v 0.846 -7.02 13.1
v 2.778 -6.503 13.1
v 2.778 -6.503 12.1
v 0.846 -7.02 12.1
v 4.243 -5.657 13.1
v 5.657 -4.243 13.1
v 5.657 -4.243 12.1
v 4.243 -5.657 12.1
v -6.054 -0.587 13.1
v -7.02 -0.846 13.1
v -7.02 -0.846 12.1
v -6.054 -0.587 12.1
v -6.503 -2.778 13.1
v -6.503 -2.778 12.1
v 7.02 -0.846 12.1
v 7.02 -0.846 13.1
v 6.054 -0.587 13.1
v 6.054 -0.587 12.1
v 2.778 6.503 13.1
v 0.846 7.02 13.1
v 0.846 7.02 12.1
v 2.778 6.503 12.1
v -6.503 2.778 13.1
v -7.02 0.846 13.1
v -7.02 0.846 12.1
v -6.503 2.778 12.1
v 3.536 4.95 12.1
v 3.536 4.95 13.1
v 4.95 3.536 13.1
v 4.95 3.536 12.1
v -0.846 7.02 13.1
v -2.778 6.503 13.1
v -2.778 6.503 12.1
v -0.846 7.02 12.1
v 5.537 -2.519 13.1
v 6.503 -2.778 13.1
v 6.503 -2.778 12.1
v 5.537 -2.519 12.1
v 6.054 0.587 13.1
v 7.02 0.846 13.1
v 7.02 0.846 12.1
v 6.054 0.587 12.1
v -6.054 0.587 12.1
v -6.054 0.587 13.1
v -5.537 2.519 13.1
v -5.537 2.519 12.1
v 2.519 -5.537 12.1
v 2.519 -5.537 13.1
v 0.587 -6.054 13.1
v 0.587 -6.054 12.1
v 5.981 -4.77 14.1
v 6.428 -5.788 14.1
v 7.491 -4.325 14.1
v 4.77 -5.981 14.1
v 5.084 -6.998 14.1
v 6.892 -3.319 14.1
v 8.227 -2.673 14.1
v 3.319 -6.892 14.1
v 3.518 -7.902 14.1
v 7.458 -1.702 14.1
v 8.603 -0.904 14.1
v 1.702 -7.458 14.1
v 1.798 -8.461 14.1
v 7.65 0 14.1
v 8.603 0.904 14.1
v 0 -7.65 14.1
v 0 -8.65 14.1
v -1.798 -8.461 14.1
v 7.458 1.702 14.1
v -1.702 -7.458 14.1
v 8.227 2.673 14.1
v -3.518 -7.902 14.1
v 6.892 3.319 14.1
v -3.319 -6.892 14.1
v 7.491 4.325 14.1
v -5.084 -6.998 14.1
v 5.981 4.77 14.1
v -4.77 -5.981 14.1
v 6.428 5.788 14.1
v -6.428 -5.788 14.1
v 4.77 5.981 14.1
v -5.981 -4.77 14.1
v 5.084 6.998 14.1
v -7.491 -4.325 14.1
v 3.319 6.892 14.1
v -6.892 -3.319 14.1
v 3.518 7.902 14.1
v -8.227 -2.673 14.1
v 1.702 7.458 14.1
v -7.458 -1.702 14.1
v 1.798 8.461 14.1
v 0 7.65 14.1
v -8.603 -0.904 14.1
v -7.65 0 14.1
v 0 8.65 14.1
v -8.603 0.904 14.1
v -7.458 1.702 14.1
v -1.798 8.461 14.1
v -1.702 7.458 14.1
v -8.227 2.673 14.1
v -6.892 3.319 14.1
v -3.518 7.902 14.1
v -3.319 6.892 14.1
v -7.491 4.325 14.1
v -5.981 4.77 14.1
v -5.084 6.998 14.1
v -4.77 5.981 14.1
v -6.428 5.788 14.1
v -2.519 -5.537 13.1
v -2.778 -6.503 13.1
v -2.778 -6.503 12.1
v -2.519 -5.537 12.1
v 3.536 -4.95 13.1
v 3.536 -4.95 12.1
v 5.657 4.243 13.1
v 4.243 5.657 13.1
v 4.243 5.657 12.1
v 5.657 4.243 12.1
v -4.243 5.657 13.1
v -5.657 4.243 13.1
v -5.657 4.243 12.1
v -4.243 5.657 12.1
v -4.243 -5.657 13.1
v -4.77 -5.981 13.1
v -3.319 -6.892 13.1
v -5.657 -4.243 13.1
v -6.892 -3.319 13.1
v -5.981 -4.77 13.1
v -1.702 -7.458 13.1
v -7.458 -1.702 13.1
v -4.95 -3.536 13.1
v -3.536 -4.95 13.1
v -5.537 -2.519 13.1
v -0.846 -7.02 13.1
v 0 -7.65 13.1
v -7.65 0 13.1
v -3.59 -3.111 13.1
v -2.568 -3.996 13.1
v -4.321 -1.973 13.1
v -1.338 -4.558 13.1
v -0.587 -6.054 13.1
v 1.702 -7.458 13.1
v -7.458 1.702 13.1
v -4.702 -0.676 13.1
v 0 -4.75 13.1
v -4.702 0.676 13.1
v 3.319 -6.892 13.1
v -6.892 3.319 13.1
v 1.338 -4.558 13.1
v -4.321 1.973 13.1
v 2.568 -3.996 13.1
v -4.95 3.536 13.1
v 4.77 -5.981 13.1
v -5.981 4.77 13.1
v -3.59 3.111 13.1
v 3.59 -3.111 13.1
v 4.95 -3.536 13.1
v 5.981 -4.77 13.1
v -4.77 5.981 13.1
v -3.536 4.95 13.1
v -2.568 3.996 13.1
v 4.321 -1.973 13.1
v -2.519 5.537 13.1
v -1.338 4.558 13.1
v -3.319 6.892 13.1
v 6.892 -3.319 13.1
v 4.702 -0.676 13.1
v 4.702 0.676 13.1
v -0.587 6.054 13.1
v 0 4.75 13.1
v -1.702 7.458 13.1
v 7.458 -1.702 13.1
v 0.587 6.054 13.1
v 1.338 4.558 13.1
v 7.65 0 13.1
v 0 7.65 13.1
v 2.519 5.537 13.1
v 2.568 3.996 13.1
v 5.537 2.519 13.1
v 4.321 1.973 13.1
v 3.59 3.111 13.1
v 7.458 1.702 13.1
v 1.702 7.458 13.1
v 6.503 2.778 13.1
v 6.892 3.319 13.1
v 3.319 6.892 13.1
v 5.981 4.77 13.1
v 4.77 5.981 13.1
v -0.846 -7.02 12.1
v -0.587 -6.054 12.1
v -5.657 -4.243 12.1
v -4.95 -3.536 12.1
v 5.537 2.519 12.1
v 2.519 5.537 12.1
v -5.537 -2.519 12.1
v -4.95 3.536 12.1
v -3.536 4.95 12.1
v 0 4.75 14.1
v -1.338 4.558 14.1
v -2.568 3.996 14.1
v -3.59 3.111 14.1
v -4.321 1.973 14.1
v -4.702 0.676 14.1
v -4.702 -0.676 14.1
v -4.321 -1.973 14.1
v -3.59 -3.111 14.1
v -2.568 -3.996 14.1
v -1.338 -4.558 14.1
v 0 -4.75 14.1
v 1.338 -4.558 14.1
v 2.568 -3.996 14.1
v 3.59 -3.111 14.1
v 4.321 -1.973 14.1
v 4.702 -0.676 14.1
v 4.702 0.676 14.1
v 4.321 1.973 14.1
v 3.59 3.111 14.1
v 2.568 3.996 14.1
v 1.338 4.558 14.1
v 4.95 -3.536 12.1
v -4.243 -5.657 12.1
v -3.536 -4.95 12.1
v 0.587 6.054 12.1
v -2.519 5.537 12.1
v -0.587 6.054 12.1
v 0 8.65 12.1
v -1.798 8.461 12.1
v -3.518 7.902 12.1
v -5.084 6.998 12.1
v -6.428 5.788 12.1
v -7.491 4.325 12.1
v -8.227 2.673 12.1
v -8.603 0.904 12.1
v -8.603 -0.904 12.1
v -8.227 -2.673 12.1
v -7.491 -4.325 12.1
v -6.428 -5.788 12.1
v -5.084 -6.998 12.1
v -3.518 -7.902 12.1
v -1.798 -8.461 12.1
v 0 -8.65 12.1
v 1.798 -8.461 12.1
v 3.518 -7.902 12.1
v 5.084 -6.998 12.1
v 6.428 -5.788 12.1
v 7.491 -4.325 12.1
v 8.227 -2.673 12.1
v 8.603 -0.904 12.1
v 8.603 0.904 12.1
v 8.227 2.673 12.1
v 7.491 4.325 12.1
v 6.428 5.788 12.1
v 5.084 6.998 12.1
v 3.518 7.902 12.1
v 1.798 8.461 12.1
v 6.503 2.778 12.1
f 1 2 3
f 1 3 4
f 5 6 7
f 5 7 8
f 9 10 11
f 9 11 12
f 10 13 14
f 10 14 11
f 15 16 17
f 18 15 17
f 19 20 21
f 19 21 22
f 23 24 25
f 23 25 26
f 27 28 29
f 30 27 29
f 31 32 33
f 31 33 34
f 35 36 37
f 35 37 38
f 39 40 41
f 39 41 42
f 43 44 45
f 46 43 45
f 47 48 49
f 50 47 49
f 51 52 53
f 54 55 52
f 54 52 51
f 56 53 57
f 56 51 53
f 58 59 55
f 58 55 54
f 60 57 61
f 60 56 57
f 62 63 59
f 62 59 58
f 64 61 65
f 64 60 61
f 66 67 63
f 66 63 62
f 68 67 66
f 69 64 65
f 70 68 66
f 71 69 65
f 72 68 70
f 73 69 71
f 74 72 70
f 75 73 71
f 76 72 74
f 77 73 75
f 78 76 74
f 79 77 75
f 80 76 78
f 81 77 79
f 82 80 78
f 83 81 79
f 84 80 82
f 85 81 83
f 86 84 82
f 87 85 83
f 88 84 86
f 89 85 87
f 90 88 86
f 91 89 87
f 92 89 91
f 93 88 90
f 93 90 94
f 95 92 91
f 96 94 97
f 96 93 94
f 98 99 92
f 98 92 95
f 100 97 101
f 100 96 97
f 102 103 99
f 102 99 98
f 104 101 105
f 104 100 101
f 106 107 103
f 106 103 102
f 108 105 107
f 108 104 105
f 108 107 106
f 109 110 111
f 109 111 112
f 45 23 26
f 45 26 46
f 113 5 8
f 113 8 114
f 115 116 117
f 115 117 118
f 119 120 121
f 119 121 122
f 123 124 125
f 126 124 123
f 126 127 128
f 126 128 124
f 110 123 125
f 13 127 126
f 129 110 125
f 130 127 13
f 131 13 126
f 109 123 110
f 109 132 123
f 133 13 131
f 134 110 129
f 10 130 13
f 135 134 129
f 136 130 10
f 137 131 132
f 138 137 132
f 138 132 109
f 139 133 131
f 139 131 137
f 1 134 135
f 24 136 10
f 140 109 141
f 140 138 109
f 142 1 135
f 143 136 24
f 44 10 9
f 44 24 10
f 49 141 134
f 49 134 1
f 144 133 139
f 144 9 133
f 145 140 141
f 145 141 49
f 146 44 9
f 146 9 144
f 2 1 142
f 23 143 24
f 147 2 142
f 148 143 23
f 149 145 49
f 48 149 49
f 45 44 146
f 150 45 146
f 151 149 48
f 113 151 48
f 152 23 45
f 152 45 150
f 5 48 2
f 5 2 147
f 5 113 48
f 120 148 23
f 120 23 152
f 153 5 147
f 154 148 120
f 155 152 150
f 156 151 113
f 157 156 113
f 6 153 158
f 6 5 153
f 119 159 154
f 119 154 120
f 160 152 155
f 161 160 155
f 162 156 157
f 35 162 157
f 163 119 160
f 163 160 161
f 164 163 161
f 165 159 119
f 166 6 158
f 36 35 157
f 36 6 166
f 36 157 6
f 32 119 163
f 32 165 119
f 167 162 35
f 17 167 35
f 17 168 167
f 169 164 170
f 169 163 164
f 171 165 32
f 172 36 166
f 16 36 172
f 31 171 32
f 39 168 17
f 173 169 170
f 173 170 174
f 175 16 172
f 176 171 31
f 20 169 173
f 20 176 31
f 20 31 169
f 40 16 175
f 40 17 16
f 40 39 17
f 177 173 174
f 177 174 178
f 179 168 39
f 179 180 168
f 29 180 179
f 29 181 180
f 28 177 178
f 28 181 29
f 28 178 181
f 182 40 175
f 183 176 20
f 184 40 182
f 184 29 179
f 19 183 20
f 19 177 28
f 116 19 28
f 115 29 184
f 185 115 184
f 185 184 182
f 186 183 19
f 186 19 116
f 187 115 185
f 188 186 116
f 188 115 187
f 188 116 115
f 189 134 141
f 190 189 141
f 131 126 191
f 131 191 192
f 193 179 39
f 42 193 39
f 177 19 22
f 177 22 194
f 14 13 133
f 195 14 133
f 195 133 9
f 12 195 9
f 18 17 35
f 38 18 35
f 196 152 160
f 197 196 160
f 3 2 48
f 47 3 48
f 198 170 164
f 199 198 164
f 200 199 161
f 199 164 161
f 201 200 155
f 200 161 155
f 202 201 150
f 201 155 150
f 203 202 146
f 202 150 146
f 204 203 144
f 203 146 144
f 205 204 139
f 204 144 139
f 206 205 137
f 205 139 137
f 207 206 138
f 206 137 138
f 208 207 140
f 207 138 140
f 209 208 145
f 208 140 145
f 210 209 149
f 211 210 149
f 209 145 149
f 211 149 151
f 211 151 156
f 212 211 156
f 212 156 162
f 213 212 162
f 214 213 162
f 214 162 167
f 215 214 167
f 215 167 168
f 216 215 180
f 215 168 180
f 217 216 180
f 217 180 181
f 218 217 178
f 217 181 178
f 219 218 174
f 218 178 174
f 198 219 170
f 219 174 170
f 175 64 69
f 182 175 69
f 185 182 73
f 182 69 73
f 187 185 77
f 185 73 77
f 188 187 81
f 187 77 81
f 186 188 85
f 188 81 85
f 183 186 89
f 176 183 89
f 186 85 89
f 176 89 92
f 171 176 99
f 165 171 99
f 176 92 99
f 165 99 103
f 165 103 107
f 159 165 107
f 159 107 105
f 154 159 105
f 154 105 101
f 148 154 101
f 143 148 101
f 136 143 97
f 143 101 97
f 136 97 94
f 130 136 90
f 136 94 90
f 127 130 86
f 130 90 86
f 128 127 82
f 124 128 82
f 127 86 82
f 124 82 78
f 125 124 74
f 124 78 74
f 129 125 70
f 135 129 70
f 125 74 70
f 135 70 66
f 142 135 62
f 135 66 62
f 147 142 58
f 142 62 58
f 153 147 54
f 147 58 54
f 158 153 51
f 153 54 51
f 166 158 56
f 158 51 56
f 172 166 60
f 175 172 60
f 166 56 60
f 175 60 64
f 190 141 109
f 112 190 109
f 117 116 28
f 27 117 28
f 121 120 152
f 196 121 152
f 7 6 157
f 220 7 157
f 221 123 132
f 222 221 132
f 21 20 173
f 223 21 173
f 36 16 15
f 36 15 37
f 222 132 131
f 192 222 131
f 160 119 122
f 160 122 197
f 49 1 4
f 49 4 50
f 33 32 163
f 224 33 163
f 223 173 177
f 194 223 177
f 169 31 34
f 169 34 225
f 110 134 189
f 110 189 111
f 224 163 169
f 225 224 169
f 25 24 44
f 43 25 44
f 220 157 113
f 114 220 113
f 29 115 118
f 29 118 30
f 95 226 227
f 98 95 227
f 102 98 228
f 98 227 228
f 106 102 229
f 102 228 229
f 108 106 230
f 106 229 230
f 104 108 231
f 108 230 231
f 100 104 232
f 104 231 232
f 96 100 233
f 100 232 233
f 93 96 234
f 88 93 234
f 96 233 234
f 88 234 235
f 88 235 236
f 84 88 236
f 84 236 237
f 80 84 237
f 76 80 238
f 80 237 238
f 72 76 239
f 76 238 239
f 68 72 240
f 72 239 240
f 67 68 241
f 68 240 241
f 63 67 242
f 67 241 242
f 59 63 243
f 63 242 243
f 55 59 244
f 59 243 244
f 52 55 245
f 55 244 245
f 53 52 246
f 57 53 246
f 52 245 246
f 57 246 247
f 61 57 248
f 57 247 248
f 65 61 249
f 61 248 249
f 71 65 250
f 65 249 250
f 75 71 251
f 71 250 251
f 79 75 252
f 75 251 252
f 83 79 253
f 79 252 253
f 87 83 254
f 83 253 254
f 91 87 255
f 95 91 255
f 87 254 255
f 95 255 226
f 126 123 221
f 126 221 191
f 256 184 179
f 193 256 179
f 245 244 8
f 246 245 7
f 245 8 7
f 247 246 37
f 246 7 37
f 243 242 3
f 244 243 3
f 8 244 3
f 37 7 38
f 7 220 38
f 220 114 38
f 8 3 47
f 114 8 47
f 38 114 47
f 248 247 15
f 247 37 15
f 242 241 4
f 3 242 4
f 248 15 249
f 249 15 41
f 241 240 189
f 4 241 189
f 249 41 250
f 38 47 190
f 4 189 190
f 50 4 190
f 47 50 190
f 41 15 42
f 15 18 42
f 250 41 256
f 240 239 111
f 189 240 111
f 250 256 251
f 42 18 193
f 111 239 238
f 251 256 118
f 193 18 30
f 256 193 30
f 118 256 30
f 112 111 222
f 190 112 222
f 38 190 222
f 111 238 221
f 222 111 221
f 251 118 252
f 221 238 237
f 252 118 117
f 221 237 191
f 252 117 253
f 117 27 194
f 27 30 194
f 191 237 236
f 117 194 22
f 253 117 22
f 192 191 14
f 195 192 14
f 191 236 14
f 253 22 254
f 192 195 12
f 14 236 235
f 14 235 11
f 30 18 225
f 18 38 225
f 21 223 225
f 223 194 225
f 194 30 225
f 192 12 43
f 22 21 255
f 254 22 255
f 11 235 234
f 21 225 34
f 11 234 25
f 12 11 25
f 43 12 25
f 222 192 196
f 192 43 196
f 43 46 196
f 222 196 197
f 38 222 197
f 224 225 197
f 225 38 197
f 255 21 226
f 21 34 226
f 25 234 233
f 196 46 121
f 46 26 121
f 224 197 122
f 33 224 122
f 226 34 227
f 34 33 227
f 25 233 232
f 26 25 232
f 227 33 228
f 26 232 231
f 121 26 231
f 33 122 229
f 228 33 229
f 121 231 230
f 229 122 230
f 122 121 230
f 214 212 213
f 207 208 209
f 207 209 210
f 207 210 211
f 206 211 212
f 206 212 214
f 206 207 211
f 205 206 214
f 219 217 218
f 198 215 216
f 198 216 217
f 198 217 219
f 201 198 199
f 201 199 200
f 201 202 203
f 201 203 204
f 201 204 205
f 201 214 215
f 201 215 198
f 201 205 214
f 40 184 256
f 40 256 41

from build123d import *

# Parameters (mm, degrees)
SKETCH004_R        = 8.65
PAD003_DEPTH       = 2
SKETCH005_R        = 7.65
POCKET_DEPTH       = 1
SKETCH006_W        = 1
SKETCH006_H        = 2
POCKET001_DEPTH    = 50.09601
POLARPATTERN_COUNT = 12
SKETCH007_R        = 4.75
PAD004_DEPTH       = 1


with BuildPart() as part:
    # Sketch004 → Pad003 (new body)
    with BuildSketch(Plane(origin=(0, 0, 12.1), x_dir=(0, 1, 0), z_dir=(0, 0, 1))):
        Circle(SKETCH004_R)
    extrude(amount=PAD003_DEPTH)

    # Sketch005 (on Face3 of Pad003) → Pocket (cut)
    with BuildSketch(Plane.XY.offset(14.1)):
        Circle(SKETCH005_R)
    extrude(amount=-POCKET_DEPTH, mode=Mode.SUBTRACT)

    # Sketch006 (on Face5 of Pocket) → Pocket001 (cut, through all)
    with BuildSketch(Plane(origin=(0, 0, 13.1), x_dir=(0.707107, 0.707107, 0), z_dir=(0, 0, 1))):
        with Locations((-6.5, 0)):
            Rectangle(SKETCH006_W, SKETCH006_H)
    pocket001 = extrude(amount=-POCKET001_DEPTH, mode=Mode.SUBTRACT)

    # PolarPattern: Pocket001 ×12 about axis
    polarpattern_axis = Axis((0, 0, 13.1), (0, 0, 1))
    for i in range(1, POLARPATTERN_COUNT):
        add(pocket001.rotate(polarpattern_axis, i * 360 / POLARPATTERN_COUNT), mode=Mode.SUBTRACT)

    # Sketch007 (on Face53 of PolarPattern) → Pad004 (join)
    with BuildSketch(Plane(origin=(0, 0, 13.1), x_dir=(0, 1, 0), z_dir=(0, 0, 1))):
        Circle(SKETCH007_R)
    extrude(amount=PAD004_DEPTH)


solid = part.part
